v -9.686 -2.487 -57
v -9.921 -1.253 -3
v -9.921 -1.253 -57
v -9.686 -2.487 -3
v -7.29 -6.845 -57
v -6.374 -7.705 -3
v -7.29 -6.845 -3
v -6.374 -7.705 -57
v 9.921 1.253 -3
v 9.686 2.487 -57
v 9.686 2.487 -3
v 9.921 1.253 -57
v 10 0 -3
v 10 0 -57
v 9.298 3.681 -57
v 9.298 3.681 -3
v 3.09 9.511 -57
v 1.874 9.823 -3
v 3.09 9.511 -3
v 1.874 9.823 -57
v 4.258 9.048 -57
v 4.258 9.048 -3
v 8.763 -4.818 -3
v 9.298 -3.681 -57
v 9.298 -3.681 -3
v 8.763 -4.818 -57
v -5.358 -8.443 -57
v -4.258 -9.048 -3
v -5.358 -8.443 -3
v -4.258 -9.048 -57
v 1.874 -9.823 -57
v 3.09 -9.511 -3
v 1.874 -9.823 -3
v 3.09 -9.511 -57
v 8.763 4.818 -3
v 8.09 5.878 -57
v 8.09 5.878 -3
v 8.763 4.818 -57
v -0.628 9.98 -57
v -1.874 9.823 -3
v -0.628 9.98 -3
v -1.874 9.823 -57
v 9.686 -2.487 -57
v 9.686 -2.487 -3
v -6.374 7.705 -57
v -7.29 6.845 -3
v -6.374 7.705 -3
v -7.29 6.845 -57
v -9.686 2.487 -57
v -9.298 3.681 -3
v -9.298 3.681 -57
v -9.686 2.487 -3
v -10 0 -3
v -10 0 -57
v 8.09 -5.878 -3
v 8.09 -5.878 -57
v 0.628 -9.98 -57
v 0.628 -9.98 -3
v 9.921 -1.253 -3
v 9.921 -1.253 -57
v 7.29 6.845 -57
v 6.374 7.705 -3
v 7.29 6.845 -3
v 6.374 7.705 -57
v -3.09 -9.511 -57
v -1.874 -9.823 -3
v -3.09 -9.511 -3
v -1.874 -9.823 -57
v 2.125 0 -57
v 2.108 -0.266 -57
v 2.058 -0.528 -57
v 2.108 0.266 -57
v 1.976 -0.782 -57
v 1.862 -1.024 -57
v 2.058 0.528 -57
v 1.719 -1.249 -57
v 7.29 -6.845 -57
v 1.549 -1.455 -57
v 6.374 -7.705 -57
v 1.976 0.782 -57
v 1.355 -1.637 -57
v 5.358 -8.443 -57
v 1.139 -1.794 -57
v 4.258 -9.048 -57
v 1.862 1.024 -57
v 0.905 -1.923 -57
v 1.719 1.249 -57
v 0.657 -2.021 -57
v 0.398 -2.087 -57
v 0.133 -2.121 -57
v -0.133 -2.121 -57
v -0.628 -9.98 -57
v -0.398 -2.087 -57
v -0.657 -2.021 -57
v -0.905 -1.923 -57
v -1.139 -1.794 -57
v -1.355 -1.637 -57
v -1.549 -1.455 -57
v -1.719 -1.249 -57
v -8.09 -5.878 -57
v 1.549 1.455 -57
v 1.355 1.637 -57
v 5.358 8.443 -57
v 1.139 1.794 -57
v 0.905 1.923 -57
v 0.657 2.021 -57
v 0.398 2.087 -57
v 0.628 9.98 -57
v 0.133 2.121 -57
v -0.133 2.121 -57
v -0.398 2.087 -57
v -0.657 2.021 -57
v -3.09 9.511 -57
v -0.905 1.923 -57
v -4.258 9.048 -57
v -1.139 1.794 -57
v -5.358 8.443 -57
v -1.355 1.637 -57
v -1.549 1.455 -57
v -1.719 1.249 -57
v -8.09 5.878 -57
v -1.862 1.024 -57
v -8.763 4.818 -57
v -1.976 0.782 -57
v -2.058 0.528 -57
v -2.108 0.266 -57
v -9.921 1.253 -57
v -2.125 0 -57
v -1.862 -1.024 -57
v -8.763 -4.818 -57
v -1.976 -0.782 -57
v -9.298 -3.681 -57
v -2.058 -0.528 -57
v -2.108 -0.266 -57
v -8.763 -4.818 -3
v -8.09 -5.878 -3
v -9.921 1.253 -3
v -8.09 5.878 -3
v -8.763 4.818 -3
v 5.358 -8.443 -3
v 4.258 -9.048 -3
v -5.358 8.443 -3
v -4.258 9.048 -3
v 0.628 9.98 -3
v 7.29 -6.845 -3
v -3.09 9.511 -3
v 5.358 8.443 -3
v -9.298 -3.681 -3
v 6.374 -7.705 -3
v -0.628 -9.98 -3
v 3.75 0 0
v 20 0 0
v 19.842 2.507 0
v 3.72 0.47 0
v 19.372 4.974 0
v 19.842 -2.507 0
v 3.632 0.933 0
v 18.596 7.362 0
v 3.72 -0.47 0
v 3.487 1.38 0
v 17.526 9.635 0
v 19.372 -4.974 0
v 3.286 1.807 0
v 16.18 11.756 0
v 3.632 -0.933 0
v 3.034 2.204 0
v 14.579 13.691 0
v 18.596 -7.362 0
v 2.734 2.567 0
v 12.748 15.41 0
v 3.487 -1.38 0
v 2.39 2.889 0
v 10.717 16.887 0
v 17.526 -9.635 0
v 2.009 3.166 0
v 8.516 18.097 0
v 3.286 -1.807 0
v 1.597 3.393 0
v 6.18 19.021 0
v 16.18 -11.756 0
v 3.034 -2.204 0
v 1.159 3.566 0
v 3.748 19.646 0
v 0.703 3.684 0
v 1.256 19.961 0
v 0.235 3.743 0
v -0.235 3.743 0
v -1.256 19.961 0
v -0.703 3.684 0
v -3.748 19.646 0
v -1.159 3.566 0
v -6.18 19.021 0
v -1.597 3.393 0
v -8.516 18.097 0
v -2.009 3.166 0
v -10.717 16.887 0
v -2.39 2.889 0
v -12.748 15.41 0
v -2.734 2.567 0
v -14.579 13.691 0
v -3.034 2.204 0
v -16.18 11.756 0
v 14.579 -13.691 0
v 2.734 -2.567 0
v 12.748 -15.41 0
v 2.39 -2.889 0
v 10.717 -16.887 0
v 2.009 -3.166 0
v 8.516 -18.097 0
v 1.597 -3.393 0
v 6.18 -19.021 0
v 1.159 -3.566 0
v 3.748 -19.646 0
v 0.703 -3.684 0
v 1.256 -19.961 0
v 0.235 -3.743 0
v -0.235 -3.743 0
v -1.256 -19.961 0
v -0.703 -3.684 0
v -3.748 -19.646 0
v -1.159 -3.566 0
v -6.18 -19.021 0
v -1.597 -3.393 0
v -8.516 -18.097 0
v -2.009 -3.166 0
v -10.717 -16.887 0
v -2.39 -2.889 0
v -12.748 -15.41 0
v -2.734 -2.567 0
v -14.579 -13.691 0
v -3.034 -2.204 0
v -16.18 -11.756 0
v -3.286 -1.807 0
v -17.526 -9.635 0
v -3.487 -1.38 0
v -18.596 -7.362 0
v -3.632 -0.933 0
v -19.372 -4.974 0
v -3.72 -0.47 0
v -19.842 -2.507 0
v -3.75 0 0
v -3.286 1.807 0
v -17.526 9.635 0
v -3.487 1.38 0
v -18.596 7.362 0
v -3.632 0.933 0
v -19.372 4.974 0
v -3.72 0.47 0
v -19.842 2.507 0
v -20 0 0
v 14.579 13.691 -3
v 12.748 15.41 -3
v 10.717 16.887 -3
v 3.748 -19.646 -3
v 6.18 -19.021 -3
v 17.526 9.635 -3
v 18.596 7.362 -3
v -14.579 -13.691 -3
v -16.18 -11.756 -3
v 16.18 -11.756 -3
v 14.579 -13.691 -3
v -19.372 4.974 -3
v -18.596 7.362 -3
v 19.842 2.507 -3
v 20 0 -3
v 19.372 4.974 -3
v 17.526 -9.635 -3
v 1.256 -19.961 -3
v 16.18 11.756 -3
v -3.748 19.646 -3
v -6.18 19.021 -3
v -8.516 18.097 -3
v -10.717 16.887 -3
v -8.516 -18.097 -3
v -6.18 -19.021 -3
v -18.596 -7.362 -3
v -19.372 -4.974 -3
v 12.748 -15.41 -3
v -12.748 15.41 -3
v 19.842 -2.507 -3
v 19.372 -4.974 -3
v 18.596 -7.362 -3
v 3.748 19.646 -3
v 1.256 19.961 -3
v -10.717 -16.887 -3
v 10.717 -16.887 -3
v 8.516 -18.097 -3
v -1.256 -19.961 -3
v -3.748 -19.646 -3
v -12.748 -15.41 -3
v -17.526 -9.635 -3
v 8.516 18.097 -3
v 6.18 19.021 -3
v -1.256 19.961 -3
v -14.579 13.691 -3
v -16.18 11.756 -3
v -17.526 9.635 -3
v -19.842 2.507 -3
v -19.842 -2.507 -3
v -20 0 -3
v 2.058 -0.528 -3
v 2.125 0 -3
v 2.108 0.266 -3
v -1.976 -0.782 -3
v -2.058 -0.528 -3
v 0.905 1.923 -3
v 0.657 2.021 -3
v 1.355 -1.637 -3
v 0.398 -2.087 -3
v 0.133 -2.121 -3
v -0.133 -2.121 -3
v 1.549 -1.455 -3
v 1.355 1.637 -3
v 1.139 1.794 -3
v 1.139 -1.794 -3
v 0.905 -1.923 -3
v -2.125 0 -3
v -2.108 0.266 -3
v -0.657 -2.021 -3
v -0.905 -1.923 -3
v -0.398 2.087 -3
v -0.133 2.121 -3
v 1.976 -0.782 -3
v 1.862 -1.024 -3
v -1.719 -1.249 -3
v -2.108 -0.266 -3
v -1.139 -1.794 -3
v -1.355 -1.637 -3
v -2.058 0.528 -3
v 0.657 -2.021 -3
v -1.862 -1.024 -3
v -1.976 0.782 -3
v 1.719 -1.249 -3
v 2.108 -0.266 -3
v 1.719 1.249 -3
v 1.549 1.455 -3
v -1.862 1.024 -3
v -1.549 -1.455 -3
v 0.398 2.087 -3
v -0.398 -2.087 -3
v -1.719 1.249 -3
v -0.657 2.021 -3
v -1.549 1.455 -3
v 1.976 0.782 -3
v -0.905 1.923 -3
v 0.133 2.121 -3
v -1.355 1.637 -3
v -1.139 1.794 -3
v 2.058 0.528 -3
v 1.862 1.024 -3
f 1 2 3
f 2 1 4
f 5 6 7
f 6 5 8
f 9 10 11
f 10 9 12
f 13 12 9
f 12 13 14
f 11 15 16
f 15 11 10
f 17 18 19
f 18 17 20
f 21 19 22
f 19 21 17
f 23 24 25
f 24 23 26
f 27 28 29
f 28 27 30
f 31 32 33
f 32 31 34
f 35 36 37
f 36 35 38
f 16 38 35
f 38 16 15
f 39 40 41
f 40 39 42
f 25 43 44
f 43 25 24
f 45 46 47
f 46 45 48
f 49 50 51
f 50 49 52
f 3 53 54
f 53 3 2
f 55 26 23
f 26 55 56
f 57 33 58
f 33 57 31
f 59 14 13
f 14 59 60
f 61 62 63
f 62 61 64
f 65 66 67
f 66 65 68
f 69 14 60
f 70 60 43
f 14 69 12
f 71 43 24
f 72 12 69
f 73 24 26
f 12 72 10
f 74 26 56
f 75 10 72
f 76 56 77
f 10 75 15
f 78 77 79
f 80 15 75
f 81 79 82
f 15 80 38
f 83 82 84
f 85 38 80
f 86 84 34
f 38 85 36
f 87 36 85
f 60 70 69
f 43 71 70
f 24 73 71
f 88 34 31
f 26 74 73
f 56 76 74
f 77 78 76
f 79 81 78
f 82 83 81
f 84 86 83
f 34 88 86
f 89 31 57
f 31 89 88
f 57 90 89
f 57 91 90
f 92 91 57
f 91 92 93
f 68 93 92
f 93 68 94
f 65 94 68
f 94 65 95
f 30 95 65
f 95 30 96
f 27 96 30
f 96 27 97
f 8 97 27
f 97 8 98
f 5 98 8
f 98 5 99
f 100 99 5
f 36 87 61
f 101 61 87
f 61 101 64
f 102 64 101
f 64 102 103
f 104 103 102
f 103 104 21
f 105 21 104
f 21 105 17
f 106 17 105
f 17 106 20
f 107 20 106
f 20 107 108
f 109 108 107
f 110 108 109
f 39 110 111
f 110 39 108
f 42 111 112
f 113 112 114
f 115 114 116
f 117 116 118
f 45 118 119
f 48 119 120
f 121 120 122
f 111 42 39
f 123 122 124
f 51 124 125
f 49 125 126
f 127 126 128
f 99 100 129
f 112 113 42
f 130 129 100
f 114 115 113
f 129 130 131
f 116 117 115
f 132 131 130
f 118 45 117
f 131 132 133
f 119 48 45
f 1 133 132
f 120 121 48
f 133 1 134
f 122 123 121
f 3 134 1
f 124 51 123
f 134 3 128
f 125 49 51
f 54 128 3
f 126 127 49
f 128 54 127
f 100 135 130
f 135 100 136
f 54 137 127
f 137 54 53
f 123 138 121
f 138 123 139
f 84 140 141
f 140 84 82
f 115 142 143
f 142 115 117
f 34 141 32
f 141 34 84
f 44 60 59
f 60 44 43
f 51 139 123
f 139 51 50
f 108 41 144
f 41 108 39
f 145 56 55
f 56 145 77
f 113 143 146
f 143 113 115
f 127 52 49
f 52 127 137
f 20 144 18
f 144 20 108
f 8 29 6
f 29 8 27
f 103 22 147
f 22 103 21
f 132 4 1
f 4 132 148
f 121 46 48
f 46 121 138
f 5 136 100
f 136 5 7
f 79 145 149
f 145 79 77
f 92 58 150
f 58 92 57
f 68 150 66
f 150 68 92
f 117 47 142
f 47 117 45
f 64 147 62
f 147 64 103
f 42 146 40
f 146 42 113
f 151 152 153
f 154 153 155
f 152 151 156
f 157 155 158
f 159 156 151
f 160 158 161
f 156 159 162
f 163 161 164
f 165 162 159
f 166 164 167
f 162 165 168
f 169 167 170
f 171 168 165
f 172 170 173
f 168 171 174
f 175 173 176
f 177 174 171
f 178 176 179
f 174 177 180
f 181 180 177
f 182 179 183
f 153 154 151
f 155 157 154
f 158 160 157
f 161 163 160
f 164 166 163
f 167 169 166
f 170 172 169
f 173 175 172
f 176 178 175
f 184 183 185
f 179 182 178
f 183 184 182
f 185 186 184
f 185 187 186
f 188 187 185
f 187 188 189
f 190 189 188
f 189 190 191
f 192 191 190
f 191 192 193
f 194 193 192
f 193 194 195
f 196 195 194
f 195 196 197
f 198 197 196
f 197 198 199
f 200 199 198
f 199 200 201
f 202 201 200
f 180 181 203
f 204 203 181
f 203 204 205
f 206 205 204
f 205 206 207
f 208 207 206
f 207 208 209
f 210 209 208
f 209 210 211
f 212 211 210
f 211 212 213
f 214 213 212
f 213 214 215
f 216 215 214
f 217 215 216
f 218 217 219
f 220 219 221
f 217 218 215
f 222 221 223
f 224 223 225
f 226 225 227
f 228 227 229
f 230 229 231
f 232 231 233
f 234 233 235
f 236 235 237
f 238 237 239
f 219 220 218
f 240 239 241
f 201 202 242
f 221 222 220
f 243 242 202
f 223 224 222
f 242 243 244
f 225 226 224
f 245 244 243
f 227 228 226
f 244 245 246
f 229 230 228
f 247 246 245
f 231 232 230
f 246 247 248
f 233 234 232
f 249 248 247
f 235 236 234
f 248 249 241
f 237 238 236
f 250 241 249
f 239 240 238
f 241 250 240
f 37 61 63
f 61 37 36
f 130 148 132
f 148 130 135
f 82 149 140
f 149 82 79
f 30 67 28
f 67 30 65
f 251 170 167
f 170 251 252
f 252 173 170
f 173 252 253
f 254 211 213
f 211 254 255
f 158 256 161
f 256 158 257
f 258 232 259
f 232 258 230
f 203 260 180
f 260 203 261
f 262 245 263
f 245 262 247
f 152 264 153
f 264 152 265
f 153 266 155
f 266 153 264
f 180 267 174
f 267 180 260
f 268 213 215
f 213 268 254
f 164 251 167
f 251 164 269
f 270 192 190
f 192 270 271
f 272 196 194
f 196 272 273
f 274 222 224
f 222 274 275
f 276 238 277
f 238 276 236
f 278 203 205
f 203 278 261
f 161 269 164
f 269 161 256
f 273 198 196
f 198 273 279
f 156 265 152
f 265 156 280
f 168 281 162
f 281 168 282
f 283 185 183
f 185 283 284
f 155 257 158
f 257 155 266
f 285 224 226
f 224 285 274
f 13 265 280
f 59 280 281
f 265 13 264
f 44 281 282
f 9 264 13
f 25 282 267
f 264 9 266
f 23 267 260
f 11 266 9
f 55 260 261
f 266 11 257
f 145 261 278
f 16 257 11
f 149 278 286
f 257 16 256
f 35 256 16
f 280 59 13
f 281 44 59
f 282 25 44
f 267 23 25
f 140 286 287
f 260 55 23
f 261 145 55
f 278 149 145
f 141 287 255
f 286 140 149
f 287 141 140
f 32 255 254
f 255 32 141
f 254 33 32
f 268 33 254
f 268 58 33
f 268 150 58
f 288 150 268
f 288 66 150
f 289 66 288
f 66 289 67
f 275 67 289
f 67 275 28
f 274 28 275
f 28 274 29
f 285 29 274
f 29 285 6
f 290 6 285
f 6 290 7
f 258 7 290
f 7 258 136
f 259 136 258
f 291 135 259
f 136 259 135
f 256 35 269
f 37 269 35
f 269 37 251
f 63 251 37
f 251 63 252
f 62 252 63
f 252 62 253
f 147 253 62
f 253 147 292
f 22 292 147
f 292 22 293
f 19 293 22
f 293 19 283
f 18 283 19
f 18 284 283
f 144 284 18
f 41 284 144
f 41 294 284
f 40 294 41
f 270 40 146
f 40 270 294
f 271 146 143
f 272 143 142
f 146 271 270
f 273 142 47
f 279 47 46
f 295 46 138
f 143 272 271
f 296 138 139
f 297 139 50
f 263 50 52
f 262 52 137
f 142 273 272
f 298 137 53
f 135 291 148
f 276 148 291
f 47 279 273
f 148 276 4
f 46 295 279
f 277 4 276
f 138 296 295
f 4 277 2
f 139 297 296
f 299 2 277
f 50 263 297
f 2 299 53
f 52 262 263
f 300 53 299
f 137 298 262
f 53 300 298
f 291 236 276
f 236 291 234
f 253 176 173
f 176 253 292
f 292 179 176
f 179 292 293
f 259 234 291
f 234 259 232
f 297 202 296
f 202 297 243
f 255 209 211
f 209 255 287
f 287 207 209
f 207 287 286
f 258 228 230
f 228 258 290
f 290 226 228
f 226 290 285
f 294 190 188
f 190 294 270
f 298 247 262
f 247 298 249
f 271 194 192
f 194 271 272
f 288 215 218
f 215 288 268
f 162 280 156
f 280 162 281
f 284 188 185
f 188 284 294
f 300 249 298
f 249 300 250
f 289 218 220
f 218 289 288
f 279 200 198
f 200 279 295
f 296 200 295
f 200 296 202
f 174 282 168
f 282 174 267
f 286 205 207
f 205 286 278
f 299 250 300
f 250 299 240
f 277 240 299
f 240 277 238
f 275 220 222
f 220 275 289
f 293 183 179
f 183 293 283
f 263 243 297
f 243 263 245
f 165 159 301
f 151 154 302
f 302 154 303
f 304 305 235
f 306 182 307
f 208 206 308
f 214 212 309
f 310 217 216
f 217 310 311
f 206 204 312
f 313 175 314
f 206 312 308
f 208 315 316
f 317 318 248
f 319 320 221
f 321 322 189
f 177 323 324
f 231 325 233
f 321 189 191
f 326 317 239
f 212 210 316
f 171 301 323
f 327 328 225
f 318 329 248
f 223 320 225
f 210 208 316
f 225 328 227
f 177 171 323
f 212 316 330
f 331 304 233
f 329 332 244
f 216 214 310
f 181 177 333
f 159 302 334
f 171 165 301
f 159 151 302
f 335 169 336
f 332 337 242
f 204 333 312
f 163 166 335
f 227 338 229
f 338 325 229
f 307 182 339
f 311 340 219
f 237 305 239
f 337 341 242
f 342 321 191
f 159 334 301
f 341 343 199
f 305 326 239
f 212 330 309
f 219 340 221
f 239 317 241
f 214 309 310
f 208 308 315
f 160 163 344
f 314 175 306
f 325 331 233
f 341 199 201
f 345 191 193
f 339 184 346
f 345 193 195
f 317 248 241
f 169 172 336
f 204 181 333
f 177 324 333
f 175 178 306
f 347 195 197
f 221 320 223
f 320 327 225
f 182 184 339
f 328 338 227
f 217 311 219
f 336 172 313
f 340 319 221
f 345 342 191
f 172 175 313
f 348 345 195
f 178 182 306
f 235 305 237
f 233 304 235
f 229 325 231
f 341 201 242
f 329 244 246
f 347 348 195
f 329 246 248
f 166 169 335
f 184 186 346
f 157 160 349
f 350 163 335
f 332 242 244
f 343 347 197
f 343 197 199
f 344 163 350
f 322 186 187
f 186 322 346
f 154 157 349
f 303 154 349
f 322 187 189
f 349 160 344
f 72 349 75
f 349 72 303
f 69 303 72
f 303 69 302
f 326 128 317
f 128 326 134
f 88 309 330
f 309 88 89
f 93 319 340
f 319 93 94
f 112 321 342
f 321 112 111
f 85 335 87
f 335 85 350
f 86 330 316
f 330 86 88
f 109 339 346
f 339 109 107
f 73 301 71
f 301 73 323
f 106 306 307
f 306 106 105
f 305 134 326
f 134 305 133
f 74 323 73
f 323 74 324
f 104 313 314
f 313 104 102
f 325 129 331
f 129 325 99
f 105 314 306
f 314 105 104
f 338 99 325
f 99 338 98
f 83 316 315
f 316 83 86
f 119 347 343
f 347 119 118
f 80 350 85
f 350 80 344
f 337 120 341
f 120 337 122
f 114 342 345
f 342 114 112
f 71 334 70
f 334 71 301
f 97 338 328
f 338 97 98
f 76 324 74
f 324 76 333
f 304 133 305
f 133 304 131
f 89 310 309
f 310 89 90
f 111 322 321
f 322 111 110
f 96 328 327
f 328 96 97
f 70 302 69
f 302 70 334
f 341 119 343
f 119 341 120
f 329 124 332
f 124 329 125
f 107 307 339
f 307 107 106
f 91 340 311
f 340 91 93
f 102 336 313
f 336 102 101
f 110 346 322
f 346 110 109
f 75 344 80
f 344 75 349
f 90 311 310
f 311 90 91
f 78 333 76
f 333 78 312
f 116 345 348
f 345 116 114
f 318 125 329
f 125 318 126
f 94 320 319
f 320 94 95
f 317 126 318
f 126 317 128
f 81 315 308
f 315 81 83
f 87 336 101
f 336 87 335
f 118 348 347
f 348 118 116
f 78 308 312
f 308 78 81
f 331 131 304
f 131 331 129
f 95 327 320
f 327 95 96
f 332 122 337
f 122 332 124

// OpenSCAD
$fn = 50;


difference() {
	union() {
		translate(v = [0, 0, -57.0000000000]) {
			cylinder(h = 57, r = 10.0000000000);
		}
		translate(v = [0, 0, -3.0000000000]) {
			cylinder(h = 3, r = 20.0000000000);
		}
	}
	union() {
		translate(v = [0, 0, 0]) {
			rotate(a = [0, 0, 0]) {
				difference() {
					union() {
						#translate(v = [0, 0, -57.0000000000]) {
							cylinder(h = 57, r = 2.0000000000);
						}
						#translate(v = [0, 0, -3]) {
							cylinder(h = 3, r = 10.0000000000, r1 = 2.1250000000, r2 = 3.7500000000);
						}
						#translate(v = [0, 0, -57.0000000000]) {
							cylinder(h = 57, r = 2.1250000000);
						}
						#translate(v = [0, 0, -57.0000000000]) {
							cylinder(h = 57, r = 2.0000000000);
						}
					}
					union();
				}
			}
		}
	}
}
